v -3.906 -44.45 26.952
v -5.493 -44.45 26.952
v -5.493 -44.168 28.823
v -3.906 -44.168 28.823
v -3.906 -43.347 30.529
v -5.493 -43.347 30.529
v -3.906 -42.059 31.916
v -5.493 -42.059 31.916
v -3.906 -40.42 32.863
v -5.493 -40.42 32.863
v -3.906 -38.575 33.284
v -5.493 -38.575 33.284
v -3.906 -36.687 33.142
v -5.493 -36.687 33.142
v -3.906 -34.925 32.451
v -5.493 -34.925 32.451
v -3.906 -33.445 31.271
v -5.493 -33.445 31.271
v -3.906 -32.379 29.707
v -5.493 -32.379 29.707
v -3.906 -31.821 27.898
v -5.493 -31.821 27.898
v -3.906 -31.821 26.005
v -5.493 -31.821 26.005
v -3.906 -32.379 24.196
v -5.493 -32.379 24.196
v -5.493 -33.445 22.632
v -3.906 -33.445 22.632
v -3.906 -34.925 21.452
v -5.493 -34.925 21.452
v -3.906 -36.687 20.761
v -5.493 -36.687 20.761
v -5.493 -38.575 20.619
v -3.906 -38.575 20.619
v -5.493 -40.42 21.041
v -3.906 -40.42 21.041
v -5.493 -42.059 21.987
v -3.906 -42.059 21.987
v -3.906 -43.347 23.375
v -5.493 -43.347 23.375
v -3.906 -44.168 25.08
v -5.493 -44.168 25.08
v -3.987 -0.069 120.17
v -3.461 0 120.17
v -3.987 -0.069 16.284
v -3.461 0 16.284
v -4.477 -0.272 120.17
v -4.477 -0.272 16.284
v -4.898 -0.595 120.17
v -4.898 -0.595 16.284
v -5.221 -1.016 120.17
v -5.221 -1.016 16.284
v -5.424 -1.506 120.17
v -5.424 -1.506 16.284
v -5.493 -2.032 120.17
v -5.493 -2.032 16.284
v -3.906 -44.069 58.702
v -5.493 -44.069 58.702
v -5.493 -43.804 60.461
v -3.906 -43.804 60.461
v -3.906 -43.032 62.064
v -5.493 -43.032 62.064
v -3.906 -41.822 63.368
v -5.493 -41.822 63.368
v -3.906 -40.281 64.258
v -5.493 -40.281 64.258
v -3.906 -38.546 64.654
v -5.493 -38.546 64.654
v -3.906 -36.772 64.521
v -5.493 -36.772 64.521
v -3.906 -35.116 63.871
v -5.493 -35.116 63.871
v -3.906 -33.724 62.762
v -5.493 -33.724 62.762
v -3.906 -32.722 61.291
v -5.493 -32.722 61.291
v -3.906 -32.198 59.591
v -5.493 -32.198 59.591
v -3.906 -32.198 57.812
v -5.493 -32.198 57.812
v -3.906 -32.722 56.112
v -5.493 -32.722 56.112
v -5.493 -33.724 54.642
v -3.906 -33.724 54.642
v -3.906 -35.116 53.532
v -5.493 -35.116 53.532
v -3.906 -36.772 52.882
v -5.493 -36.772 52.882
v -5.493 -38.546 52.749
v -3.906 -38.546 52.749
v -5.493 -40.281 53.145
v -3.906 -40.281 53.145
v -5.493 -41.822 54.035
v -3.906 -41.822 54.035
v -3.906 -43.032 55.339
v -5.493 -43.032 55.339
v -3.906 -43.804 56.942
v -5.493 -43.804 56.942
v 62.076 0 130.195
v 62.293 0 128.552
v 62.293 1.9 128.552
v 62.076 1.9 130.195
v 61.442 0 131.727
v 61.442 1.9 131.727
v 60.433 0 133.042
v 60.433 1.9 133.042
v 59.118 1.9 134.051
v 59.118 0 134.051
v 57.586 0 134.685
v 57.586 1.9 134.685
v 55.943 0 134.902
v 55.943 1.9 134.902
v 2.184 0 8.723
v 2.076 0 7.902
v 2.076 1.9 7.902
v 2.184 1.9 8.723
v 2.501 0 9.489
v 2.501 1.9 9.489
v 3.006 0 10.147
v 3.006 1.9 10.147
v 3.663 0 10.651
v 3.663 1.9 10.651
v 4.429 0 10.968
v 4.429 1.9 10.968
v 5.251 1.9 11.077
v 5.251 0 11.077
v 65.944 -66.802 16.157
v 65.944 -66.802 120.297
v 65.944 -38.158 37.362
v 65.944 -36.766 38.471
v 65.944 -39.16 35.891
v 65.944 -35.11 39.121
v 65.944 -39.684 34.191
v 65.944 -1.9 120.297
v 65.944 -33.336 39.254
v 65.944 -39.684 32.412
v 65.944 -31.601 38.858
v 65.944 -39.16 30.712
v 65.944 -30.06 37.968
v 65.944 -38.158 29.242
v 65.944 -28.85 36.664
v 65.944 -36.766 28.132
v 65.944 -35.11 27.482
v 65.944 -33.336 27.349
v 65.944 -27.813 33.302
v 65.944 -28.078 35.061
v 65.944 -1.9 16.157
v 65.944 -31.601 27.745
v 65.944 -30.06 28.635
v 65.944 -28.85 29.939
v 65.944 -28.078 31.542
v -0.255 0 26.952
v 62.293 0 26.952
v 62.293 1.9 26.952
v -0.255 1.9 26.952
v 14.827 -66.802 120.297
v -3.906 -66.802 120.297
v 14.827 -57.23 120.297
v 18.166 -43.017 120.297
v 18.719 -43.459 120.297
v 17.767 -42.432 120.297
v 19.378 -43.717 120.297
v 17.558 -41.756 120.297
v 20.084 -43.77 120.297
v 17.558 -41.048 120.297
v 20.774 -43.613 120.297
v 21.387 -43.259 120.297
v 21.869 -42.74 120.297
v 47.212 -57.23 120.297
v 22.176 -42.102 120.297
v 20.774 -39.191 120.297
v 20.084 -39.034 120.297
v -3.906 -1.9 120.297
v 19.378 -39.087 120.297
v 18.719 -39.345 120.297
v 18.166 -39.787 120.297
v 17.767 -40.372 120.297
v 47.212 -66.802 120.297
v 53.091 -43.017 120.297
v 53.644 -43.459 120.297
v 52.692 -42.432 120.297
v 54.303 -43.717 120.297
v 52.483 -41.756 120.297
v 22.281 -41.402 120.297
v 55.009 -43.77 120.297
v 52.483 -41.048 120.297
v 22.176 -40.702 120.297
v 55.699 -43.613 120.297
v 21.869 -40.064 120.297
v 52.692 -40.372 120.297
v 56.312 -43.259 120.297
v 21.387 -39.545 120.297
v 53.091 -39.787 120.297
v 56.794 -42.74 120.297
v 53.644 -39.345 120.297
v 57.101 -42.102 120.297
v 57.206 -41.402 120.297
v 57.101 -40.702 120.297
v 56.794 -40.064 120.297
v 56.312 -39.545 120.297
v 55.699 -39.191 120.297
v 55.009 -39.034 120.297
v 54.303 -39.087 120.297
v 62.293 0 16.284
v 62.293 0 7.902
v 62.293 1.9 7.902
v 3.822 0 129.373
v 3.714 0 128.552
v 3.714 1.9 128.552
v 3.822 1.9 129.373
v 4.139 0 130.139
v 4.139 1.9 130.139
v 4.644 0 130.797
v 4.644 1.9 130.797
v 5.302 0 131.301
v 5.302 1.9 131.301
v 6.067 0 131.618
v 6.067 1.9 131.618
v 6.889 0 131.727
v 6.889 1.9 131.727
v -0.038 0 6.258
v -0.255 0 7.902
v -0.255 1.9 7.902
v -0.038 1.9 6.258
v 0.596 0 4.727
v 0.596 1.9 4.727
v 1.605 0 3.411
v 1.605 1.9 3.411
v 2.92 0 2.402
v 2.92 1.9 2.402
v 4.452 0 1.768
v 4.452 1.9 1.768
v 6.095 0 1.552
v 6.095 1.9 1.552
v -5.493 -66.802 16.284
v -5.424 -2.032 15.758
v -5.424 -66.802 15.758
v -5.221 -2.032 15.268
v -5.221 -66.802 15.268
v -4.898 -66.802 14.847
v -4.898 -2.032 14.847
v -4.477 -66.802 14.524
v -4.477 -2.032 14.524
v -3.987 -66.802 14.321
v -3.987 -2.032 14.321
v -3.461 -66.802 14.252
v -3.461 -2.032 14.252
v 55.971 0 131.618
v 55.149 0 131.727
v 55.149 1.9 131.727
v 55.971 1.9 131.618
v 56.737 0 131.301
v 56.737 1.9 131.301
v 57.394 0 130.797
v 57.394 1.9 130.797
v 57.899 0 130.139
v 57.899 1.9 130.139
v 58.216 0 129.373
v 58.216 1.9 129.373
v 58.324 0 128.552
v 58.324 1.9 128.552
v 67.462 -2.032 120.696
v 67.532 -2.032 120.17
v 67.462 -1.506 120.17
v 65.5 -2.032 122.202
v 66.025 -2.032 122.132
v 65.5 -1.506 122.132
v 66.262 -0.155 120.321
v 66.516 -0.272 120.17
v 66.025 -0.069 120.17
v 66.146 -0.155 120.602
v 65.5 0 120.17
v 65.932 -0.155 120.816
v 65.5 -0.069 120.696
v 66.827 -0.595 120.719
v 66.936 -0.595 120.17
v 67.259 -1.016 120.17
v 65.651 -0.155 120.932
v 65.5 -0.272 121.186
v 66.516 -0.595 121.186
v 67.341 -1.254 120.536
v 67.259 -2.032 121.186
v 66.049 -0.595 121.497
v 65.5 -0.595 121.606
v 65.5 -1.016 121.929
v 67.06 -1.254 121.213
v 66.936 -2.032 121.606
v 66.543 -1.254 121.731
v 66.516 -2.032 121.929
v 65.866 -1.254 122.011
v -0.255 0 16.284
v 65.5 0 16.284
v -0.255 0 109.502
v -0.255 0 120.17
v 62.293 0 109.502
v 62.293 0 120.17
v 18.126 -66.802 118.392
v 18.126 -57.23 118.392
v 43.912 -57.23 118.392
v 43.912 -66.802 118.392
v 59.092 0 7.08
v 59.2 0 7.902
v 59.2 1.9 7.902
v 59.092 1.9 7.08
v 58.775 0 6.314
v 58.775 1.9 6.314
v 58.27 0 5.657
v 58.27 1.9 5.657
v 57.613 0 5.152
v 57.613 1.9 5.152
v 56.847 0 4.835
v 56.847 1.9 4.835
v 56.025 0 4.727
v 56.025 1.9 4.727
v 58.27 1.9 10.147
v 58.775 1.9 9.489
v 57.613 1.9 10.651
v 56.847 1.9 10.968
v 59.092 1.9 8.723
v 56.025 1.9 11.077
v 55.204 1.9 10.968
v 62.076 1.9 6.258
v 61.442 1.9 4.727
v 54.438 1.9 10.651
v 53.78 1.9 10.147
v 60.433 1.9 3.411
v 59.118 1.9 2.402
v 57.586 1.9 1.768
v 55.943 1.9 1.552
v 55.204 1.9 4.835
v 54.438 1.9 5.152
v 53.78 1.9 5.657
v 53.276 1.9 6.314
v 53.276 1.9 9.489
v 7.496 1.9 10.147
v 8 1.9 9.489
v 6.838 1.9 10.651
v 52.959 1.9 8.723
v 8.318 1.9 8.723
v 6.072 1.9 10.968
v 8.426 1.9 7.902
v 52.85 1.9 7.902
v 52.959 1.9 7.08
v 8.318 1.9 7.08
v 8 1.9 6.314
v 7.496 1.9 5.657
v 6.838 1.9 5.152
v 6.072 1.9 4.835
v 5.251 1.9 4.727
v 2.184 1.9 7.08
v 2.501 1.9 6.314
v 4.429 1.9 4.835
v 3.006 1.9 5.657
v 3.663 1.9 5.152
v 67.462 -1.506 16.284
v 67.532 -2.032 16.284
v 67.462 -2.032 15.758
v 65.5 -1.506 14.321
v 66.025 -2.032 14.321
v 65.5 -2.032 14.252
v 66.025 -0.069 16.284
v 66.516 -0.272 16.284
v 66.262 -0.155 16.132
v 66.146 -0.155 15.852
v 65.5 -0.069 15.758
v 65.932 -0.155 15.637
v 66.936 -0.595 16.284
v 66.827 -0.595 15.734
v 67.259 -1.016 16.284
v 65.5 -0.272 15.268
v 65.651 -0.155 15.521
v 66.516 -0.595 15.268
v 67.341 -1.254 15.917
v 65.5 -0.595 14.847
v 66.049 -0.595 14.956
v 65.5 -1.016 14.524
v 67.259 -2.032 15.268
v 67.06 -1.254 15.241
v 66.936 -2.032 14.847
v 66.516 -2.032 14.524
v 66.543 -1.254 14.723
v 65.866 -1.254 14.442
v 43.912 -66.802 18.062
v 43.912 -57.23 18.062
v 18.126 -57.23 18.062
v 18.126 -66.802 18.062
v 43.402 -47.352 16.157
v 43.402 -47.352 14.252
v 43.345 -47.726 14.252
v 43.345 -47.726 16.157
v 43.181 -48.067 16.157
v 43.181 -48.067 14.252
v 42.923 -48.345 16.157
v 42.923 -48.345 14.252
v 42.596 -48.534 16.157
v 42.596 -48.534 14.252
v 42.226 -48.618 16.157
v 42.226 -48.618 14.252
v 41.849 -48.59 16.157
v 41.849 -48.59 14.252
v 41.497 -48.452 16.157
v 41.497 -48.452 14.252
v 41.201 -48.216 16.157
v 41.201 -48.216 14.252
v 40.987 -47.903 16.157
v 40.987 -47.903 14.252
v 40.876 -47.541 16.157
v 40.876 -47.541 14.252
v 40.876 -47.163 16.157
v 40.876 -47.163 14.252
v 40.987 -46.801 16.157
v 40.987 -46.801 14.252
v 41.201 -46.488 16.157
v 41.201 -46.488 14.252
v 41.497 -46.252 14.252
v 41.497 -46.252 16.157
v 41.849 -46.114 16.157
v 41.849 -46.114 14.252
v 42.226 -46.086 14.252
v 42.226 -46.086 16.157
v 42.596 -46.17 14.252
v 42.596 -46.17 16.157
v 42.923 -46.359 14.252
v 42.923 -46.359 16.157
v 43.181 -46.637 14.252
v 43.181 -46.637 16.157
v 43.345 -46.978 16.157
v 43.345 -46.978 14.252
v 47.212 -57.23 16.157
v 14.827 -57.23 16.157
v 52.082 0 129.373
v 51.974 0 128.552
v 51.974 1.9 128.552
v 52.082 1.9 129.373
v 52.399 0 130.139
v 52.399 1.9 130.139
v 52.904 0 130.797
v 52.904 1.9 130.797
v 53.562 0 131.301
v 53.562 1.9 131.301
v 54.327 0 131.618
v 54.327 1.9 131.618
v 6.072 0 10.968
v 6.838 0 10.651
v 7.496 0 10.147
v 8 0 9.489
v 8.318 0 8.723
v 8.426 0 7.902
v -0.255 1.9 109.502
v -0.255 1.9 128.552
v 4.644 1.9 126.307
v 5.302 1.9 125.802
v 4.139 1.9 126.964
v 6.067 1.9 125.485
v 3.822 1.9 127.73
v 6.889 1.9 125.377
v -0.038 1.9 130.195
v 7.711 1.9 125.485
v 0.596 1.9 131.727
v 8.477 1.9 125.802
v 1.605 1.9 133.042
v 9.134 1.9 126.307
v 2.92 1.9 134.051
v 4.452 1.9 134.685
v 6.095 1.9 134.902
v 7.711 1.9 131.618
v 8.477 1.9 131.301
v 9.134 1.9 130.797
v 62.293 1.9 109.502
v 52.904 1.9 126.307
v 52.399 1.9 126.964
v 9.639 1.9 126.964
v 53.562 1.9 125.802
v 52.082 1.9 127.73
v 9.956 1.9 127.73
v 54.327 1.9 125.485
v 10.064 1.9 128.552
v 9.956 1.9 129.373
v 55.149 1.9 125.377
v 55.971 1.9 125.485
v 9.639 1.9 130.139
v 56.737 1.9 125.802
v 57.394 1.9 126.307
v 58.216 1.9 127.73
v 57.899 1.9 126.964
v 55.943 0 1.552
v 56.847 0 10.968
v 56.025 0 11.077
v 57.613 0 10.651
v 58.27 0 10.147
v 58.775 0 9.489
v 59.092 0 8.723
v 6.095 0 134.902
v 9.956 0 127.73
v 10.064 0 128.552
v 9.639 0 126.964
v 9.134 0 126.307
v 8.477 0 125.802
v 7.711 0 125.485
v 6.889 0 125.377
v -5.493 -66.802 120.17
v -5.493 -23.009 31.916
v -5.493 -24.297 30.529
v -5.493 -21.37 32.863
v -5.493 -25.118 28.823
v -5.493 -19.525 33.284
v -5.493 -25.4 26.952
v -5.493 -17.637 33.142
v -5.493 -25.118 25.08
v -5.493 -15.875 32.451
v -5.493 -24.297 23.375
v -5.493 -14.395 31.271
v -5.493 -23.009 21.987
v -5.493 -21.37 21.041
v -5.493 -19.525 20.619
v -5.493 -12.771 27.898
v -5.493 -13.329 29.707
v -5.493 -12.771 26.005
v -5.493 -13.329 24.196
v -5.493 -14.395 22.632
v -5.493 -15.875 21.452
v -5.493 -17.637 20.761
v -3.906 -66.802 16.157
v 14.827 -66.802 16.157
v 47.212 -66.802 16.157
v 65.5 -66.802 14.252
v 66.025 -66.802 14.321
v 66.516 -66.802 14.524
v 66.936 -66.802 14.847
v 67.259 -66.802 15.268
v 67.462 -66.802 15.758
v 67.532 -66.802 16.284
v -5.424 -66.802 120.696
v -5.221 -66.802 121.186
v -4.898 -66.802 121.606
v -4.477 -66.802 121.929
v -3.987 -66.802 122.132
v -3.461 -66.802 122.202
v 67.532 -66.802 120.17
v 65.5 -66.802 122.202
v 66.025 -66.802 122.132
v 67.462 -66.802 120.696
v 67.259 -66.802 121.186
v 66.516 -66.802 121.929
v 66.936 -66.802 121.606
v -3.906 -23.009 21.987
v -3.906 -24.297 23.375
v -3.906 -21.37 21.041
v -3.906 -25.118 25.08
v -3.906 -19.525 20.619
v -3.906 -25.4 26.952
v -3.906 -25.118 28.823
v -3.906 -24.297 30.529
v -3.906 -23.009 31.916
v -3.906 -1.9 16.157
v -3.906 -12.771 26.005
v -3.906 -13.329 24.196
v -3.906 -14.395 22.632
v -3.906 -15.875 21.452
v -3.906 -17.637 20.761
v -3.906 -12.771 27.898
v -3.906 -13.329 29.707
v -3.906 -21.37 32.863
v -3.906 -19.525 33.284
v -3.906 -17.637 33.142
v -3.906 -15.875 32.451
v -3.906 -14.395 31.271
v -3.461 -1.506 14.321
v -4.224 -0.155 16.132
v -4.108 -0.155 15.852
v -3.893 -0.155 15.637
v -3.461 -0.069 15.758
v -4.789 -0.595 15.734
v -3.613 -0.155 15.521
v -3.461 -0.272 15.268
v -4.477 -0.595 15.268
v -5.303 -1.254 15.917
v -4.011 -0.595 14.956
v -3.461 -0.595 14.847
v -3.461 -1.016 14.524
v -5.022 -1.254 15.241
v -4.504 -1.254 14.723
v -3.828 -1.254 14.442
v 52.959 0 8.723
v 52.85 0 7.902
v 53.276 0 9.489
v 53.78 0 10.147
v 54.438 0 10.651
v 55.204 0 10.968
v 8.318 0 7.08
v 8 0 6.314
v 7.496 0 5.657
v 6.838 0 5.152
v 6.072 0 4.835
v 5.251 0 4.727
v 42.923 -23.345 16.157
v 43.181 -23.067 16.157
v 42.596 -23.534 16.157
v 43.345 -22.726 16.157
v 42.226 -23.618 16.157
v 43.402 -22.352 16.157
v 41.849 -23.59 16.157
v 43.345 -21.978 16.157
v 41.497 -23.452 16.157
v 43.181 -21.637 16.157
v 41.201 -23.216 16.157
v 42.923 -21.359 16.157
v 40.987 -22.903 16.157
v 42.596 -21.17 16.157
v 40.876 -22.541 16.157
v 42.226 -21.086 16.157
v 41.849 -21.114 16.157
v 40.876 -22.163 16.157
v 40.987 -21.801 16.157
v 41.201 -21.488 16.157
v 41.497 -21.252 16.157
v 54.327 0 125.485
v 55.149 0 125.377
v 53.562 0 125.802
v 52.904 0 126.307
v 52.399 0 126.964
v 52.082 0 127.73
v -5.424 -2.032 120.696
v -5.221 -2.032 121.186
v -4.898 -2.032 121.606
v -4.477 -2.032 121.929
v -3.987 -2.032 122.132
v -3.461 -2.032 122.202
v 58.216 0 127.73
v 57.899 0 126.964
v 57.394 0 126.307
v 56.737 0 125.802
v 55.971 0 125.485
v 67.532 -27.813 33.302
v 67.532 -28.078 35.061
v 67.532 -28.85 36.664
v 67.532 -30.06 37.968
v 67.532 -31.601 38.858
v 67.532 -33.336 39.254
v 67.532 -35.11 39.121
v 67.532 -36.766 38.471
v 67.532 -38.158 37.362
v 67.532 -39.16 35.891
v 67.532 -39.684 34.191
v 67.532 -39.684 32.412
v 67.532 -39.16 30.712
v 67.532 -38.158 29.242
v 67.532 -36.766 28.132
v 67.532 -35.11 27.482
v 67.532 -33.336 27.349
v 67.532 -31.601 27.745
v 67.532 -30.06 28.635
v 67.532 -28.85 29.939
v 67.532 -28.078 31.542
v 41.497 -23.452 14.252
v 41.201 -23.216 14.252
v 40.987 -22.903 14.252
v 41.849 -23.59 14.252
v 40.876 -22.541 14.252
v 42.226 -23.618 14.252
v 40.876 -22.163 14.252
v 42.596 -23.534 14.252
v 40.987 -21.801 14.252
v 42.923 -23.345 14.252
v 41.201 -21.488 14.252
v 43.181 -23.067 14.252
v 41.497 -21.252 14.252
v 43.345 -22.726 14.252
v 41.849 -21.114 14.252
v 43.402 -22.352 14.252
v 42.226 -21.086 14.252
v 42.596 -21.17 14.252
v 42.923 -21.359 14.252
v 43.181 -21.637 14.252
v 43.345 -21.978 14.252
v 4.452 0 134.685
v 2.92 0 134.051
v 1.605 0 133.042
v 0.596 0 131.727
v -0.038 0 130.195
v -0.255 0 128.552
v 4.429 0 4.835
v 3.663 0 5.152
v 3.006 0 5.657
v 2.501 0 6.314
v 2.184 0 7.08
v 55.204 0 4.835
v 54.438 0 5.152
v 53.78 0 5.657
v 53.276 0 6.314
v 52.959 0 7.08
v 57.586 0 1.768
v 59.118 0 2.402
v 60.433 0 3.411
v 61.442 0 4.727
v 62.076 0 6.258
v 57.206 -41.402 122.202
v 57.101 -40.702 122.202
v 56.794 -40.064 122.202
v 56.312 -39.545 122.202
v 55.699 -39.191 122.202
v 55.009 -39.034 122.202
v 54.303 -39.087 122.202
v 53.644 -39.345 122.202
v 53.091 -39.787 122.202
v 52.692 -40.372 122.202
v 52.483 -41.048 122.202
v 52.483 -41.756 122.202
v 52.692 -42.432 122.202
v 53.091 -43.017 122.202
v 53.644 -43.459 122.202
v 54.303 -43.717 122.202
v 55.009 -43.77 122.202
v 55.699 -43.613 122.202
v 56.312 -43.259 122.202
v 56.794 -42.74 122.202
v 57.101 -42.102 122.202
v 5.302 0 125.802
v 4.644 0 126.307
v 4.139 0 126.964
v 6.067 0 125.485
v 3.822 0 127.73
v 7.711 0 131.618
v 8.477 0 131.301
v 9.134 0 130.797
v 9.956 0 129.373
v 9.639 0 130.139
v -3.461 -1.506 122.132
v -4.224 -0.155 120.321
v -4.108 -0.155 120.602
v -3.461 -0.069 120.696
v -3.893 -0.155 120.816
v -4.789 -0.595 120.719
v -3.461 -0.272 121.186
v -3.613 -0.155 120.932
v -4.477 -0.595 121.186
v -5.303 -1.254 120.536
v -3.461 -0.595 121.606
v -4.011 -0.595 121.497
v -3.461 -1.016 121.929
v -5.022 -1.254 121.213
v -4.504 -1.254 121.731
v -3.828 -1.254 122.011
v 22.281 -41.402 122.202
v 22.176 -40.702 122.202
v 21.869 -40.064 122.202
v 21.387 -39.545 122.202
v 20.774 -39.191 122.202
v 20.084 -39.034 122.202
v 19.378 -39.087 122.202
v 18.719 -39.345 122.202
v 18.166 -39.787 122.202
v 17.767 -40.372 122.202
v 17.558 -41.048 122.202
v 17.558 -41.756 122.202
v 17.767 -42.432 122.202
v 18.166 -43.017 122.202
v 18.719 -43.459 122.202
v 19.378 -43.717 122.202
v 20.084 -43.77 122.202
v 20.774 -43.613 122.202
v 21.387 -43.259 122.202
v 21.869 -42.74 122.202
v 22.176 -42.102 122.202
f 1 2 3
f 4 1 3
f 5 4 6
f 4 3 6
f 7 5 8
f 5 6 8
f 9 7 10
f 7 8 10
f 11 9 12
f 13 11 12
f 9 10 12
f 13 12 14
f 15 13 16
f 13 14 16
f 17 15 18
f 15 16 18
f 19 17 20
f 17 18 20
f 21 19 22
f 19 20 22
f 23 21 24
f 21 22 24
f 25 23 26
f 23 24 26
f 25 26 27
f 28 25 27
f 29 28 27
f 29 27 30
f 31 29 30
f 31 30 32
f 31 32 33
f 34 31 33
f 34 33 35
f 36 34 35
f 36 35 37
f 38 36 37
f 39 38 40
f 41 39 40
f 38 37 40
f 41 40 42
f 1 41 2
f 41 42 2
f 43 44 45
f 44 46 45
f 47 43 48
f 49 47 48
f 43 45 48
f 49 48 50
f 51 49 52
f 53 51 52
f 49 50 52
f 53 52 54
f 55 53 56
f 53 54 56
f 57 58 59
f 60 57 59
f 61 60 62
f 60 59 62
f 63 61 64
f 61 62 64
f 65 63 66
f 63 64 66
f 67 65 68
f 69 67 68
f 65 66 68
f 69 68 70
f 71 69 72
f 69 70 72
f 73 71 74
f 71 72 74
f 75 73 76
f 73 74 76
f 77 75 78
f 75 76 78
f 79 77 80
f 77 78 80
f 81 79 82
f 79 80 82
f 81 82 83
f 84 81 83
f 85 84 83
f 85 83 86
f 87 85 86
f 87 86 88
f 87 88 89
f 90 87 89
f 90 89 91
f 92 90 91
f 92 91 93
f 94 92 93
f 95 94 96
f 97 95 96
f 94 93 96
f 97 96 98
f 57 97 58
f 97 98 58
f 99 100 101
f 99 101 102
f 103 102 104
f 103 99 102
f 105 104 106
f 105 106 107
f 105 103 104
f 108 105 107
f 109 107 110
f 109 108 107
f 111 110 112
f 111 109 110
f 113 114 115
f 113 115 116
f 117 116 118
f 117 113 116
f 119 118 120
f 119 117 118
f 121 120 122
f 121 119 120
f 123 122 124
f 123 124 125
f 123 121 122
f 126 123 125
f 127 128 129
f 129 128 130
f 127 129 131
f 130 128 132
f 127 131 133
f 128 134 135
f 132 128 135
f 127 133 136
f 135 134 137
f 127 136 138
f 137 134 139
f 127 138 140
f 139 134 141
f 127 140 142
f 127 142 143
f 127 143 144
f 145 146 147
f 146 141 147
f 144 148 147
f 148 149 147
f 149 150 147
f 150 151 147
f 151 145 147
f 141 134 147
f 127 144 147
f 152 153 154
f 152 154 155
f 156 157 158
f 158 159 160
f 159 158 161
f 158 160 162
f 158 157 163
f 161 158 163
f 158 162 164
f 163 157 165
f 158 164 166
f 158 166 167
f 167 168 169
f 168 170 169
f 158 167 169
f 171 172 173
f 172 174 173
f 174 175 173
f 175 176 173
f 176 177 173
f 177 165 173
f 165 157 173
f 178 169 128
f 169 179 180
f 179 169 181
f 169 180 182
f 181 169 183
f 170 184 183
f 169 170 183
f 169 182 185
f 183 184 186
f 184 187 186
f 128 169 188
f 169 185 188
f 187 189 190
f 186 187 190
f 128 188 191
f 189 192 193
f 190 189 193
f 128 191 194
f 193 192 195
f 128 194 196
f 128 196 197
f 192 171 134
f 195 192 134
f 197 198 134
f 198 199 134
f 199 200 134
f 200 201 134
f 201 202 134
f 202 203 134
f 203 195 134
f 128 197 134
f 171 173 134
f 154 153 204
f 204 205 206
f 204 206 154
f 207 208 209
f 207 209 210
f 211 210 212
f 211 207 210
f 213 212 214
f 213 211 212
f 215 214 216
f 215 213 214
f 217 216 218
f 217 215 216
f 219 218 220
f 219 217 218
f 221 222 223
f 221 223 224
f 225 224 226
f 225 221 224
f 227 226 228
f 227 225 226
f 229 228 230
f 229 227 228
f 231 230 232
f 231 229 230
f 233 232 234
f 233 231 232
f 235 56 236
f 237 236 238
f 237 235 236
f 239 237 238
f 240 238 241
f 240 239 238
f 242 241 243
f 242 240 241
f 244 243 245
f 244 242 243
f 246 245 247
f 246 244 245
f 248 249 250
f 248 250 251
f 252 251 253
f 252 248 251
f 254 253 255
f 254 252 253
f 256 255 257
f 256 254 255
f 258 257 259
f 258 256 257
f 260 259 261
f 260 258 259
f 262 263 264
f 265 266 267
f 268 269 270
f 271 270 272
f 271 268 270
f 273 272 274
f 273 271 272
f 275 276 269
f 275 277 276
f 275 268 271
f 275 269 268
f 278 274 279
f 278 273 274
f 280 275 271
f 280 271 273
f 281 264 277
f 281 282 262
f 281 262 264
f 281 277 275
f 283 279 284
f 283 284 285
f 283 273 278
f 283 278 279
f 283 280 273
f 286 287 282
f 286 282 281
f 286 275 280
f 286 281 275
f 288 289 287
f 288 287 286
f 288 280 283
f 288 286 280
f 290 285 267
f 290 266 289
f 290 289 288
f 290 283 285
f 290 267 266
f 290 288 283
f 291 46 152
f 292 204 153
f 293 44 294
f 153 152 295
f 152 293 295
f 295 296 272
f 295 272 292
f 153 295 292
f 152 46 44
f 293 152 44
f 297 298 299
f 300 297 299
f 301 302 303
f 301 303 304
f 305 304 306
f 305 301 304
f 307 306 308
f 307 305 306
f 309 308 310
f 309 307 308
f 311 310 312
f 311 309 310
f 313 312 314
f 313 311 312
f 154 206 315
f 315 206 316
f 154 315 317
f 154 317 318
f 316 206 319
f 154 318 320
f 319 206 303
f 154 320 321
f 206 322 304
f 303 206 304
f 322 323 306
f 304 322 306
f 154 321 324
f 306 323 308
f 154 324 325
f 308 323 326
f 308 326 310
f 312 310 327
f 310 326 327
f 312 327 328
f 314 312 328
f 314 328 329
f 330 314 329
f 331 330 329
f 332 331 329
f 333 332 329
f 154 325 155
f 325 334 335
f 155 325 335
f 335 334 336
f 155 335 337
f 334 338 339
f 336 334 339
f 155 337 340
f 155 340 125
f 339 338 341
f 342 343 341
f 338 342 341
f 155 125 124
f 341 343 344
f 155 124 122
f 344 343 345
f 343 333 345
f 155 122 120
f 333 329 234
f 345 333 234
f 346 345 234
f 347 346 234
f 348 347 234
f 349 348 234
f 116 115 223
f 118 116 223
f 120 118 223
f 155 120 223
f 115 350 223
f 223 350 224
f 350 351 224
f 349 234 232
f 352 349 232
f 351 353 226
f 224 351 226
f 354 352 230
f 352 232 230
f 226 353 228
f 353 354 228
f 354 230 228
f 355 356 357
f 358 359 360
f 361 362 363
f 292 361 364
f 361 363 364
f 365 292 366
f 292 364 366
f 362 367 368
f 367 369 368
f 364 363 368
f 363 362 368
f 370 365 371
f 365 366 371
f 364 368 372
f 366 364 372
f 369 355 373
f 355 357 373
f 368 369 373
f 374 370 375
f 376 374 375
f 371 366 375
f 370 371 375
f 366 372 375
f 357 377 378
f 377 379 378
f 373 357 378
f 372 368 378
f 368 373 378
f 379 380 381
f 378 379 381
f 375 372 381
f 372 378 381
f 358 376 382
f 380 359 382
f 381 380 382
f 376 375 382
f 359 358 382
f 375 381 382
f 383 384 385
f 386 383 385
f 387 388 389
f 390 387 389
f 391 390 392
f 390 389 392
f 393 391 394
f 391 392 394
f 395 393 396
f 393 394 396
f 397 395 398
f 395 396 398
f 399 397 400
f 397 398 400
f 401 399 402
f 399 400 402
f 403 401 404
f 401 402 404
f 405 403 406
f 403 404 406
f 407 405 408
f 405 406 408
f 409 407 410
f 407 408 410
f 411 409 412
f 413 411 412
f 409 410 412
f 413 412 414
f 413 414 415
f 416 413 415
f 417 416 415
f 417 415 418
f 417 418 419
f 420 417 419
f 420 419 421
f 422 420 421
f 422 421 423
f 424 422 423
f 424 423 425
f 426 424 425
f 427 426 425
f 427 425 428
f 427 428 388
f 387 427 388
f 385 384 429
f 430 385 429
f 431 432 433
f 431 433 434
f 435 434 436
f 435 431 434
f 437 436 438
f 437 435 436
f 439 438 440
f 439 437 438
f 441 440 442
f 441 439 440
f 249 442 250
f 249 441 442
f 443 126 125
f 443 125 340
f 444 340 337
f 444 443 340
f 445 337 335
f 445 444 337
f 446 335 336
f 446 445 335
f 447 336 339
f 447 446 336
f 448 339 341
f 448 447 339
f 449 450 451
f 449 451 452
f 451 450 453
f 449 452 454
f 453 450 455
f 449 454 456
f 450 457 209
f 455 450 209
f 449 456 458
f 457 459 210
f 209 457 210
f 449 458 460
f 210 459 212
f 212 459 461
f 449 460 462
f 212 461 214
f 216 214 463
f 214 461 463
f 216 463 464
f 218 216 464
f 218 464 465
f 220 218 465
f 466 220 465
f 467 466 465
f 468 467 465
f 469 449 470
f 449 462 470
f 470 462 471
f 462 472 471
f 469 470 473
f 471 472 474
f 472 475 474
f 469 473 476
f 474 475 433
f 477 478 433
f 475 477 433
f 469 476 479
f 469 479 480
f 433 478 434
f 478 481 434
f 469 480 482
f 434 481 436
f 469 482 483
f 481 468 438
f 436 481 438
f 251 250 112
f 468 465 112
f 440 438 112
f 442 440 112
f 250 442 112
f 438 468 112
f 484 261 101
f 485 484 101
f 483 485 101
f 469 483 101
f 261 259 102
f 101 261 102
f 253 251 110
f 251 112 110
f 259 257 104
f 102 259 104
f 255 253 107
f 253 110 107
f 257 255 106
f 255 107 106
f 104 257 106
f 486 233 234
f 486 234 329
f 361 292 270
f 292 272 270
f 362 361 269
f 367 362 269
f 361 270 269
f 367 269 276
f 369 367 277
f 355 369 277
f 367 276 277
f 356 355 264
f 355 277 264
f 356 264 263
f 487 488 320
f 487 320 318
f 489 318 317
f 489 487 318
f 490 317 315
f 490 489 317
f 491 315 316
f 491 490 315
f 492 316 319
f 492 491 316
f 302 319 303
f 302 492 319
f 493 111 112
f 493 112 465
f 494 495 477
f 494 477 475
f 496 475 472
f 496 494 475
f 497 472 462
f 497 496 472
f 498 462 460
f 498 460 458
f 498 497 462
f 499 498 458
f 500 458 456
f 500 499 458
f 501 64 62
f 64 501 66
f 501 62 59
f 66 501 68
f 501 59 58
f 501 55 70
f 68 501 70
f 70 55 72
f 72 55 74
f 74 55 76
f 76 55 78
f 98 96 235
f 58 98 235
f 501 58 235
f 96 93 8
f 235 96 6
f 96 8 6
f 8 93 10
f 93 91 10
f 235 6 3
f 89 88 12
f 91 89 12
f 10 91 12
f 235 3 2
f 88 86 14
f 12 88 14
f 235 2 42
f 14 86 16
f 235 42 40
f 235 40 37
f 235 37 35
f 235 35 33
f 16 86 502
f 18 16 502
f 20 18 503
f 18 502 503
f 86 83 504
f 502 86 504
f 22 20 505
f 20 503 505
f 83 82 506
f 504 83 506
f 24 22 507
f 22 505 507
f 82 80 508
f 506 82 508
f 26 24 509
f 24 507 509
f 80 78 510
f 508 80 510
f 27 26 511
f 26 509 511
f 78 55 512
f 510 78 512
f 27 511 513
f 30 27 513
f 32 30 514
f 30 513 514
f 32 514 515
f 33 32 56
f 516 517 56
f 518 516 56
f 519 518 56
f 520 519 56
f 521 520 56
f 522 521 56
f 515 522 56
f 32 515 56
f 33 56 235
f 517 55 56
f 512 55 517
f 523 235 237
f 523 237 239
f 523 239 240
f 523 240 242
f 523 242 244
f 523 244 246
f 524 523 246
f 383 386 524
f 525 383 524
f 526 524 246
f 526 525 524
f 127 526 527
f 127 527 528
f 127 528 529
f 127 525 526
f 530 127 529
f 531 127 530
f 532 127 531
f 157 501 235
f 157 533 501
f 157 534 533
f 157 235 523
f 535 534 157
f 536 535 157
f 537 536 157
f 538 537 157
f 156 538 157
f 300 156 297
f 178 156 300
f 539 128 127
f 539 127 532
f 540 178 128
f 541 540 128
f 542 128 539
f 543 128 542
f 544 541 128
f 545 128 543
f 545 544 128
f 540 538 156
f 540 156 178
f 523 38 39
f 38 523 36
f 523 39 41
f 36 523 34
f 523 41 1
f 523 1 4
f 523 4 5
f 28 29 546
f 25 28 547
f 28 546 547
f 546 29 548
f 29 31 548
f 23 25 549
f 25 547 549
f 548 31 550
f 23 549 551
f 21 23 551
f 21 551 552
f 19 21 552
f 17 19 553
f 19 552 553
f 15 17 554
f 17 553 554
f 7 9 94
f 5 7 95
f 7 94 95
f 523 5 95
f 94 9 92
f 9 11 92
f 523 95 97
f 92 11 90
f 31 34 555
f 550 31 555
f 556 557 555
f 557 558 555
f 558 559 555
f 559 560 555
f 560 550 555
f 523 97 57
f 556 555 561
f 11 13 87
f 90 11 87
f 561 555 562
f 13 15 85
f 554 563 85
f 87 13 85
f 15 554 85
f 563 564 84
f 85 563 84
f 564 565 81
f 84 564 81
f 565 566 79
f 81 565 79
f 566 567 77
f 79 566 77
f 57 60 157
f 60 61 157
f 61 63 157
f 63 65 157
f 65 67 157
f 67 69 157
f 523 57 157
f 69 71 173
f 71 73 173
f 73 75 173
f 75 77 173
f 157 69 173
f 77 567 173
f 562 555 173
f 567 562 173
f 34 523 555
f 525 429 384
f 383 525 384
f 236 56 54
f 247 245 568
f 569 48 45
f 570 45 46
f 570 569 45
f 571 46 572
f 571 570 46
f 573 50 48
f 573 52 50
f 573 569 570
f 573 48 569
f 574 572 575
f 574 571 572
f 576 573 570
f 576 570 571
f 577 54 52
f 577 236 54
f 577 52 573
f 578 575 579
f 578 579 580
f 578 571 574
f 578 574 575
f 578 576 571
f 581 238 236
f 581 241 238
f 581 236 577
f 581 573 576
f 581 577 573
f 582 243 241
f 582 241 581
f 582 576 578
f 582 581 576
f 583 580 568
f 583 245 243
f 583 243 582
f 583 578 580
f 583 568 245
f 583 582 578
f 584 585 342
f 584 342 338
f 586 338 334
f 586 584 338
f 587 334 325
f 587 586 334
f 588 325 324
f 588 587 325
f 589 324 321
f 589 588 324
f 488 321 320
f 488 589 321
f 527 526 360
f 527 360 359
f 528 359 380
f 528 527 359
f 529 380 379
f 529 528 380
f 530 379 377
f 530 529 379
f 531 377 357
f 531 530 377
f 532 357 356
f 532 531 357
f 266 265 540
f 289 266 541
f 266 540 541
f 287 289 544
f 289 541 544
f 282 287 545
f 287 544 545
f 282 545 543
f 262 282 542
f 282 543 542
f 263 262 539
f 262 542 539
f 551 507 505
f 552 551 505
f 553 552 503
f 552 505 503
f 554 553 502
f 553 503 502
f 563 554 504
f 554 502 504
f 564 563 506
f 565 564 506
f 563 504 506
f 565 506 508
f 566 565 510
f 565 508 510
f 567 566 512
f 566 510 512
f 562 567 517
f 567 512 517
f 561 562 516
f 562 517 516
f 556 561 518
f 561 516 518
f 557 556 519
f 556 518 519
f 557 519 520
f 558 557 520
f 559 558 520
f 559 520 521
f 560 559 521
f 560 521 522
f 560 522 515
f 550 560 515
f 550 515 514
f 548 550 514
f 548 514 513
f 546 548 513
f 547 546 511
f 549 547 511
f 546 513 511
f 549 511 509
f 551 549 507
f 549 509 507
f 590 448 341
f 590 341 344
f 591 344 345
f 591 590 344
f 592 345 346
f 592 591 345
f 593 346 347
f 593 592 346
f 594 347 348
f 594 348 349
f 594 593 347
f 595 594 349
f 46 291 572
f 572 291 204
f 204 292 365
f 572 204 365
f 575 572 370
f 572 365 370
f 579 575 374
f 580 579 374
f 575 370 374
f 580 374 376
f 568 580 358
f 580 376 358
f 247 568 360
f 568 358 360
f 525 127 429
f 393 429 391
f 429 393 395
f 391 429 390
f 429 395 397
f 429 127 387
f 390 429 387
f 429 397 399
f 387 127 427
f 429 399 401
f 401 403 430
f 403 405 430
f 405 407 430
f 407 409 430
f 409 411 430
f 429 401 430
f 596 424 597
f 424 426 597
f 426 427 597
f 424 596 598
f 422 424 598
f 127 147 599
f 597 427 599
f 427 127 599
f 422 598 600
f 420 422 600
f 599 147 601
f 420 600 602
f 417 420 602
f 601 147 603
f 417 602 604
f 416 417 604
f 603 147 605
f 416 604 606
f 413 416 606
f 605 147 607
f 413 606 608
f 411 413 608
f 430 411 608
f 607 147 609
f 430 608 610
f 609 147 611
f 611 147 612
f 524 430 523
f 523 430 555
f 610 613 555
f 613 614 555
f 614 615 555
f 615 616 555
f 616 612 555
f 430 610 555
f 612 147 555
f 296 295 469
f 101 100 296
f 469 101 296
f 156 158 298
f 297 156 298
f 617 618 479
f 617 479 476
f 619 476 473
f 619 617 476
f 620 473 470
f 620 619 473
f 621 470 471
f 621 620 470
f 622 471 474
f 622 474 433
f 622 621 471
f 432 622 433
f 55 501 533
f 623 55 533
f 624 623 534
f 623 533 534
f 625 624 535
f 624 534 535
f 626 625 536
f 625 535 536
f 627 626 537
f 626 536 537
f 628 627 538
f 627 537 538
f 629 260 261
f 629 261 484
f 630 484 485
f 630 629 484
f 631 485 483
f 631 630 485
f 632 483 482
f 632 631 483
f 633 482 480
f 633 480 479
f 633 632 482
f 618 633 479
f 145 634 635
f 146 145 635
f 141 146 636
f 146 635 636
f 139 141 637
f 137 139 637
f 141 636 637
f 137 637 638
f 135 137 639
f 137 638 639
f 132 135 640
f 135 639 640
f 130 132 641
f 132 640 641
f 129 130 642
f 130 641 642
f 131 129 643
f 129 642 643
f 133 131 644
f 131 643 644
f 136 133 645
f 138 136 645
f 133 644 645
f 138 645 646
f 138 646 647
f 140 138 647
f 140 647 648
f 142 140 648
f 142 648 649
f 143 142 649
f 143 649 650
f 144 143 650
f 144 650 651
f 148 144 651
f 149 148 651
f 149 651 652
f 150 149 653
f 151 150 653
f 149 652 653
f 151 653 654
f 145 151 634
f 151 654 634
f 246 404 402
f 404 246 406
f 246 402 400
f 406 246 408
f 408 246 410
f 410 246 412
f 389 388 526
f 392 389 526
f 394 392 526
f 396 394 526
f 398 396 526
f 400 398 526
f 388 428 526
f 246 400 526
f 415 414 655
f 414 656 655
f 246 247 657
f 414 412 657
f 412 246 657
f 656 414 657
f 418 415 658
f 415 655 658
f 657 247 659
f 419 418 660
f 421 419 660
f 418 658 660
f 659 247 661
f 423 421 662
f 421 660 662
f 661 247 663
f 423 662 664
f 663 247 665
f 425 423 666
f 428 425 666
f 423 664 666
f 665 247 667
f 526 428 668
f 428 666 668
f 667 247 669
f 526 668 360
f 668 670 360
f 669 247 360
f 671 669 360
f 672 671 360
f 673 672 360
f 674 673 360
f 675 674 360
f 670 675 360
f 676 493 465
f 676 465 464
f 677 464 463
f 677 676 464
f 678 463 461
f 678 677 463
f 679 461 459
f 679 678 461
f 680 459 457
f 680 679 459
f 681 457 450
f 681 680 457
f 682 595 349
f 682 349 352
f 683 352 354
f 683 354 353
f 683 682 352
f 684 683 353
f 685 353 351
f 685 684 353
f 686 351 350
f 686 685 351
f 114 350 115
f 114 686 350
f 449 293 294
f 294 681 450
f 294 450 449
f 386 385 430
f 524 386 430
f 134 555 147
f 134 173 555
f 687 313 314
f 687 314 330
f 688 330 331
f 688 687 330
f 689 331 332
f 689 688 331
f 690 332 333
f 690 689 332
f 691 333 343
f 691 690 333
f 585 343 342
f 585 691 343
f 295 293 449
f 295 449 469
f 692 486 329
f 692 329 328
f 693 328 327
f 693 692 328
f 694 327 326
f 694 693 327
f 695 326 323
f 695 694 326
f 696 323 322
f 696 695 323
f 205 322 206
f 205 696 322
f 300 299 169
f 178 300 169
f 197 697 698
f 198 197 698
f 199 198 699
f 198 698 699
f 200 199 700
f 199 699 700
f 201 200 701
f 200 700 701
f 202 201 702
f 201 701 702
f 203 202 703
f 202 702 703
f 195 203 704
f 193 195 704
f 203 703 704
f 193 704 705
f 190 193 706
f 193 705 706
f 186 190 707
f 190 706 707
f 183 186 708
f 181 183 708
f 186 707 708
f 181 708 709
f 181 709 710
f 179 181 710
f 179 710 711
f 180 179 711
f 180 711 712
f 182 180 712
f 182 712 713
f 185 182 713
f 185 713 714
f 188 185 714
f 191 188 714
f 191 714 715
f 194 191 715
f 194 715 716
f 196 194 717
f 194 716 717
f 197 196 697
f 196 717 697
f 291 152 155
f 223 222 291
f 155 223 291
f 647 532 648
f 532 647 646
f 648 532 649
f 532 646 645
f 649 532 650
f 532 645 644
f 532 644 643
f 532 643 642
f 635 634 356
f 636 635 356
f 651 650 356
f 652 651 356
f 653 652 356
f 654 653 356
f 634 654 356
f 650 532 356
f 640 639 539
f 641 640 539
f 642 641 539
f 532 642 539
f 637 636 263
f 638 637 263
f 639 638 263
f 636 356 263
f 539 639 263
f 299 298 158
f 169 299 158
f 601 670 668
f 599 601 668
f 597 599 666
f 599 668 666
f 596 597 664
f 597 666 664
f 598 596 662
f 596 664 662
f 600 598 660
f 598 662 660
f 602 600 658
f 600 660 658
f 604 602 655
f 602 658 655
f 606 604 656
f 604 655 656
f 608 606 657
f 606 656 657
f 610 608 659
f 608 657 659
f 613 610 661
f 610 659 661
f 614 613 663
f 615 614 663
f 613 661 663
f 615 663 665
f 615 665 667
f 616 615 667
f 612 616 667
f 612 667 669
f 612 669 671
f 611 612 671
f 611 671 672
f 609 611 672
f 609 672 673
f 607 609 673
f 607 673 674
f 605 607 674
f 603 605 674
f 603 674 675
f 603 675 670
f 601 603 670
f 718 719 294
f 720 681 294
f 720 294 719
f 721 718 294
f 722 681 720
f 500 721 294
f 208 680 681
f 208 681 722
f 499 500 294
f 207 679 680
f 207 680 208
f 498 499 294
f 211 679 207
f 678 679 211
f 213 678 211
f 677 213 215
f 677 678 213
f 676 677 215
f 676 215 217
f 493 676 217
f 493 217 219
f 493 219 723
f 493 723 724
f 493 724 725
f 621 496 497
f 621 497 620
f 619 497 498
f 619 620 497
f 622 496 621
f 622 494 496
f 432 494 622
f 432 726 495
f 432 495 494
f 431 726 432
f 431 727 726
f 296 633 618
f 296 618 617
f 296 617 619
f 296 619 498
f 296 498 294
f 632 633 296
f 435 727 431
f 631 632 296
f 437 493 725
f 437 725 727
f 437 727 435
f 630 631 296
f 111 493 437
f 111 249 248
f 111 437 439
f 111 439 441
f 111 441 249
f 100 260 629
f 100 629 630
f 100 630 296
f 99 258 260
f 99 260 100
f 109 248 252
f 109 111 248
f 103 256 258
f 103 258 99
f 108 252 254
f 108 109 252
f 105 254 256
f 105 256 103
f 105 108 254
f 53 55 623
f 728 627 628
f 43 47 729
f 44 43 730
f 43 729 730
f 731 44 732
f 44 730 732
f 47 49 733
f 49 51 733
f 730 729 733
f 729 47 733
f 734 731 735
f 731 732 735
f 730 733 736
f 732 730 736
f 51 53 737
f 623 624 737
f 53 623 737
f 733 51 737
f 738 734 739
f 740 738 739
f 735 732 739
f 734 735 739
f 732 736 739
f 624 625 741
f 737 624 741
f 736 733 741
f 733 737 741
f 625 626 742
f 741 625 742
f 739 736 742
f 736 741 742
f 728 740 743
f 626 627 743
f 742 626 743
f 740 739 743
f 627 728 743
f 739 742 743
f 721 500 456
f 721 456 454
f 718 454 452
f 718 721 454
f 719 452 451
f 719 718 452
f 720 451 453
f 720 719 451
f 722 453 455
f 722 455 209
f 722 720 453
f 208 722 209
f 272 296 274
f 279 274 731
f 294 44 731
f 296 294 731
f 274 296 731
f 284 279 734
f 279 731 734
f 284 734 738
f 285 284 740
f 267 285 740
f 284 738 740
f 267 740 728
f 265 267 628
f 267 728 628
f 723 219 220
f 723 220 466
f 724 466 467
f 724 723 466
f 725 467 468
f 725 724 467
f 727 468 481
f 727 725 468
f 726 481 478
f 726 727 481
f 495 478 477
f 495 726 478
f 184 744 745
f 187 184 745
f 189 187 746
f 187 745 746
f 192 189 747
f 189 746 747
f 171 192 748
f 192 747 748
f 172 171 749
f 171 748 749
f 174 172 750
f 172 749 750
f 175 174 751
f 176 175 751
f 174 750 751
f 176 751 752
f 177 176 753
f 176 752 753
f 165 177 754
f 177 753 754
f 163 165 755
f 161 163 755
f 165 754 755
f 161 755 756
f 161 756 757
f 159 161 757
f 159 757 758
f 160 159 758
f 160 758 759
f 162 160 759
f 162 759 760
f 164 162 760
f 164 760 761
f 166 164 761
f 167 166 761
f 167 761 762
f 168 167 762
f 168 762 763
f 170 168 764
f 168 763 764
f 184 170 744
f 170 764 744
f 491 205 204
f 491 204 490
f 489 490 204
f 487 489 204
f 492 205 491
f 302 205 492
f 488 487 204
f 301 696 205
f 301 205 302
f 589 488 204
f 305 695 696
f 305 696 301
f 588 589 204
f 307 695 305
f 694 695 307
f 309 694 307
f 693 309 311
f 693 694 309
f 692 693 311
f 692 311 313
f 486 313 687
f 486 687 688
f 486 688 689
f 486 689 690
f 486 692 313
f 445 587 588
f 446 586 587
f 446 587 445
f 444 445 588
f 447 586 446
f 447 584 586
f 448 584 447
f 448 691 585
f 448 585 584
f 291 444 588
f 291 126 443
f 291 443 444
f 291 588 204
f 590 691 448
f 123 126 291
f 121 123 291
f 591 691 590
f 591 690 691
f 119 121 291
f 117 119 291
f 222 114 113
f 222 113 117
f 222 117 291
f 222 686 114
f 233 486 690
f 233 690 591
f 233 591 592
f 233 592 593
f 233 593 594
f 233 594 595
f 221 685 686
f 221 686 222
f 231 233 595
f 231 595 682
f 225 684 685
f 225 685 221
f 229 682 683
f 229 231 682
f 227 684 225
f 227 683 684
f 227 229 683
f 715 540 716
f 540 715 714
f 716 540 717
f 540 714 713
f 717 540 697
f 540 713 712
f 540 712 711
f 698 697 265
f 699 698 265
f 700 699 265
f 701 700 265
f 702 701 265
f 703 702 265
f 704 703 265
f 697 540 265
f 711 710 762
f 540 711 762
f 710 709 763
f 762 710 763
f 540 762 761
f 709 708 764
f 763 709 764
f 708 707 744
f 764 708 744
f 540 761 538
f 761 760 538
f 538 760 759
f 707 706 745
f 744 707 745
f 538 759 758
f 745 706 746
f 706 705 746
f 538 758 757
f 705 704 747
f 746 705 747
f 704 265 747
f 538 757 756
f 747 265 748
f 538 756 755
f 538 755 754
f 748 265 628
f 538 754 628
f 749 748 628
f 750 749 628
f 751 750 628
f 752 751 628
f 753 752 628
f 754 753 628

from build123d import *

# Parameters (mm, degrees)
F1_DEPTH   = 66.802
F2_DEPTH   = 1.9
F3_DEPTH   = 1.9
F4_R       = 2.032
F5_DEPTH   = 12.7
F6_DEPTH   = 12.7
F7_R       = 6.35
F8_DEPTH   = 1.5875
F9_R       = 1.27
F10_DEPTH  = 3.81
F11_W      = 43.18
F11_H      = 55.3302187473
F1_FACE3_W = 18.7325
F1_FACE3_H = 64.902
F12_DEPTH  = 1.905
F13_W      = 43.18
F13_H      = 55.3302187473
F14_DEPTH  = 1.905
F15_R      = 2.3749
F16_DEPTH  = 1.905
F17_R      = 5.969
F18_DEPTH  = 1.5875
F19_R      = 5.969
F20_DEPTH  = 1.5875


with BuildPart() as f1:
    # F0 (on Front) → F1 (new body)
    with BuildSketch(Plane.XZ):
        Polygon((62.2927888, 122.2015844), (-0.2547112, 122.2015844), (-5.4934612, 122.2015844), (-5.4934612, 14.2515844), (-0.2547112, 14.2515844), (62.2927888, 14.2515844), (67.5315388, 14.2515844), (67.5315388, 122.2015844), align=None)
        Polygon((65.9440388, 120.2965844), (65.9440388, 16.1565844), (47.2115388, 16.1565844), (43.9119772, 18.0615844), (18.1261004, 18.0615844), (14.8265388, 16.1565844), (-3.9059612, 16.1565844), (-3.9059612, 120.2965844), (14.8265388, 120.2965844), (18.1261004, 118.3915844), (43.9119772, 118.3915844), (47.2115388, 120.2965844), align=None, mode=Mode.SUBTRACT)
    extrude(amount=F1_DEPTH)

    # F0 (on Front) → F3 (join)
    with BuildSketch(Plane.XZ):
        Polygon((47.2115388, 16.1565844), (65.9440388, 16.1565844), (65.9440388, 120.2965844), (47.2115388, 120.2965844), (43.9119772, 118.3915844), (18.1261004, 118.3915844), (14.8265388, 120.2965844), (-3.9059612, 120.2965844), (-3.9059612, 16.1565844), (14.8265388, 16.1565844), (18.1261004, 18.0615844), (43.9119772, 18.0615844), align=None)
    extrude(amount=F3_DEPTH)

    # F4
    f4_edges = [f1.edges().sort_by_distance(p)[0] for p in [
        (-5.493461, -33.401, 122.201584),
        (67.531539, -33.401, 122.201584),
        (67.531539, -33.401, 14.251584),
        (-5.493461, -33.401, 14.251584),
        (-5.493461, 0, 68.226584),
        (67.531539, 0, 68.226584),
        (31.019039, 0, 122.201584),
        (31.019039, 0, 14.251584),
    ]]
    fillet(f4_edges, radius=F4_R)



with BuildPart() as f2:
    # F0 (on Front) → F2 (new body)
    with BuildSketch(Plane.XZ):
        with BuildLine():
            Line((62.2927888, 14.2515844), (-0.2547112, 14.2515844))
            Line((-0.2547112, 14.2515844), (-0.2547112, 7.9015844))
            ThreePointArc((-0.2547112, 7.9015844), (1.6051607395, 3.4114563395), (6.0952888, 1.5515844))
            Line((6.0952888, 1.5515844), (55.9427888, 1.5515844))
            ThreePointArc((55.9427888, 1.5515844), (60.4329168605, 3.4114563395), (62.2927888, 7.9015844))
            Line((62.2927888, 7.9015844), (62.2927888, 14.2515844))
        make_face()
        with BuildLine():
            ThreePointArc((5.2507388, 11.0765844), (7.4958028303, 10.1466484303), (8.4257388, 7.9015844))
            ThreePointArc((8.4257388, 7.9015844), (7.4958028303, 5.6565203697), (5.2507388, 4.7265844))
            ThreePointArc((5.2507388, 4.7265844), (3.0056747697, 5.6565203697), (2.0757388, 7.9015844))
            ThreePointArc((2.0757388, 7.9015844), (3.0056747697, 10.1466484303), (5.2507388, 11.0765844))
        make_face(mode=Mode.SUBTRACT)
        with BuildLine():
            ThreePointArc((56.0253388, 11.0765844), (58.2704028303, 10.1466484303), (59.2003388, 7.9015844))
            ThreePointArc((59.2003388, 7.9015844), (58.2704028303, 5.6565203697), (56.0253388, 4.7265844))
            ThreePointArc((56.0253388, 4.7265844), (53.7802747697, 5.6565203697), (52.8503388, 7.9015844))
            ThreePointArc((52.8503388, 7.9015844), (53.7802747697, 10.1466484303), (56.0253388, 11.0765844))
        make_face(mode=Mode.SUBTRACT)
    extrude(amount=-F2_DEPTH)


with BuildPart() as f2b:
    # F0 (on Front) → F2, piece 2 (new body)
    with BuildSketch(Plane.XZ):
        with BuildLine():
            Line((55.9427888, 134.9015844), (6.0952888, 134.9015844))
            ThreePointArc((6.0952888, 134.9015844), (1.6051607395, 133.0417124605), (-0.2547112, 128.5515844))
            Line((-0.2547112, 128.5515844), (-0.2547112, 122.2015844))
            Line((-0.2547112, 122.2015844), (62.2927888, 122.2015844))
            Line((62.2927888, 122.2015844), (62.2927888, 128.5515844))
            ThreePointArc((62.2927888, 128.5515844), (60.4329168605, 133.0417124605), (55.9427888, 134.9015844))
        make_face()
        with BuildLine():
            ThreePointArc((6.8890388, 131.7265844), (9.1341028303, 130.7966484303), (10.0640388, 128.5515844))
            ThreePointArc((10.0640388, 128.5515844), (9.1341028303, 126.3065203697), (6.8890388, 125.3765844))
            ThreePointArc((6.8890388, 125.3765844), (4.6439747697, 126.3065203697), (3.7140388, 128.5515844))
            ThreePointArc((3.7140388, 128.5515844), (4.6439747697, 130.7966484303), (6.8890388, 131.7265844))
        make_face(mode=Mode.SUBTRACT)
        with BuildLine():
            ThreePointArc((55.1490388, 131.7265844), (57.3941028303, 130.7966484303), (58.3240388, 128.5515844))
            ThreePointArc((58.3240388, 128.5515844), (57.3941028303, 126.3065203697), (55.1490388, 125.3765844))
            ThreePointArc((55.1490388, 125.3765844), (52.9039747697, 126.3065203697), (51.9740388, 128.5515844))
            ThreePointArc((51.9740388, 128.5515844), (52.9039747697, 130.7966484303), (55.1490388, 131.7265844))
        make_face(mode=Mode.SUBTRACT)
    extrude(amount=-F2_DEPTH)


with BuildPart() as f1_1:
    add(f1.part)
    # F5 (add): a face of the model
    f5_faces = [f2.part.faces().sort_by_distance(p)[0] for p in [
        (31.0190388, 0.95, 14.2515844),
    ]]

    add(f2.part)  # F5 merges F2
    extrude(f5_faces, amount=F5_DEPTH)

    # F6 (add): a face of the model
    f6_faces = [f2b.part.faces().sort_by_distance(p)[0] for p in [
        (31.0190388, 0.95, 122.2015844),
    ]]

    add(f2b.part)  # F6 merges F2b
    extrude(f6_faces, amount=F6_DEPTH)

    # F7 (on face) → F8 (cut, through all)
    with BuildSketch(Plane(origin=(-5.4934612, 0, 0), x_dir=(0, -1, 0), z_dir=(-1, 0, 0))):
        with Locations((38.1, 26.9515844)):
            Circle(F7_R)
        with Locations((19.05, 26.9515844)):
            Circle(F7_R)
    extrude(amount=-F8_DEPTH, mode=Mode.SUBTRACT)

    # F9 (on face) → F10 (cut, through all)
    with BuildSketch(Plane(origin=(0, 0, 14.2515844), x_dir=(1, 0, 0), z_dir=(0, 0, -1))):
        with Locations((42.1315388, 47.352)):
            Circle(F9_R)
        with Locations((42.1315388, 22.352)):
            Circle(F9_R)
    extrude(amount=-F10_DEPTH, mode=Mode.SUBTRACT)

    # F11 (on face) + F1_face3 (on face) → F12 (cut, through all)
    with BuildSketch(Plane(origin=(0, 0, 118.3915844), x_dir=(1, 0, 0), z_dir=(0, 0, -1))):
        with Locations((32.6428469086, 29.5651093736)):
            Rectangle(F11_W, F11_H)
    with BuildSketch(Plane(origin=(5.4602888, -34.351, 16.1565844), x_dir=(1, 0, 0), z_dir=(0, 0, 1))):
        Rectangle(F1_FACE3_W, F1_FACE3_H)
    extrude(amount=-F12_DEPTH, dir=(0, 0, -1), mode=Mode.SUBTRACT)

    # F13 (on face) → F14 (cut, through all)
    with BuildSketch(Plane.XY.offset(18.0615844)):
        with Locations((30.3840388, -29.5651093736)):
            Rectangle(F13_W, F13_H)
    extrude(amount=-F14_DEPTH, mode=Mode.SUBTRACT)

    # F15 (on face) → F16 (cut, through all)
    with BuildSketch(Plane.XY.offset(122.2015844)):
        with Locations((19.9065388, -41.402)):
            Circle(F15_R)
        with Locations((54.8315388, -41.402)):
            Circle(F15_R)
    extrude(amount=-F16_DEPTH, mode=Mode.SUBTRACT)

    # F17 (on face) → F18 (cut, through all)
    with BuildSketch(Plane.YZ.offset(67.5315388)):
        with Locations((-33.782, 33.3015844)):
            Circle(F17_R)
    extrude(amount=-F18_DEPTH, mode=Mode.SUBTRACT)

    # F19 (on face) → F20 (cut, through all)
    with BuildSketch(Plane(origin=(-5.4934612, 0, 0), x_dir=(0, -1, 0), z_dir=(-1, 0, 0))):
        with Locations((38.1, 58.7015844)):
            Circle(F19_R)
    extrude(amount=-F20_DEPTH, mode=Mode.SUBTRACT)


solid = f1_1.part
